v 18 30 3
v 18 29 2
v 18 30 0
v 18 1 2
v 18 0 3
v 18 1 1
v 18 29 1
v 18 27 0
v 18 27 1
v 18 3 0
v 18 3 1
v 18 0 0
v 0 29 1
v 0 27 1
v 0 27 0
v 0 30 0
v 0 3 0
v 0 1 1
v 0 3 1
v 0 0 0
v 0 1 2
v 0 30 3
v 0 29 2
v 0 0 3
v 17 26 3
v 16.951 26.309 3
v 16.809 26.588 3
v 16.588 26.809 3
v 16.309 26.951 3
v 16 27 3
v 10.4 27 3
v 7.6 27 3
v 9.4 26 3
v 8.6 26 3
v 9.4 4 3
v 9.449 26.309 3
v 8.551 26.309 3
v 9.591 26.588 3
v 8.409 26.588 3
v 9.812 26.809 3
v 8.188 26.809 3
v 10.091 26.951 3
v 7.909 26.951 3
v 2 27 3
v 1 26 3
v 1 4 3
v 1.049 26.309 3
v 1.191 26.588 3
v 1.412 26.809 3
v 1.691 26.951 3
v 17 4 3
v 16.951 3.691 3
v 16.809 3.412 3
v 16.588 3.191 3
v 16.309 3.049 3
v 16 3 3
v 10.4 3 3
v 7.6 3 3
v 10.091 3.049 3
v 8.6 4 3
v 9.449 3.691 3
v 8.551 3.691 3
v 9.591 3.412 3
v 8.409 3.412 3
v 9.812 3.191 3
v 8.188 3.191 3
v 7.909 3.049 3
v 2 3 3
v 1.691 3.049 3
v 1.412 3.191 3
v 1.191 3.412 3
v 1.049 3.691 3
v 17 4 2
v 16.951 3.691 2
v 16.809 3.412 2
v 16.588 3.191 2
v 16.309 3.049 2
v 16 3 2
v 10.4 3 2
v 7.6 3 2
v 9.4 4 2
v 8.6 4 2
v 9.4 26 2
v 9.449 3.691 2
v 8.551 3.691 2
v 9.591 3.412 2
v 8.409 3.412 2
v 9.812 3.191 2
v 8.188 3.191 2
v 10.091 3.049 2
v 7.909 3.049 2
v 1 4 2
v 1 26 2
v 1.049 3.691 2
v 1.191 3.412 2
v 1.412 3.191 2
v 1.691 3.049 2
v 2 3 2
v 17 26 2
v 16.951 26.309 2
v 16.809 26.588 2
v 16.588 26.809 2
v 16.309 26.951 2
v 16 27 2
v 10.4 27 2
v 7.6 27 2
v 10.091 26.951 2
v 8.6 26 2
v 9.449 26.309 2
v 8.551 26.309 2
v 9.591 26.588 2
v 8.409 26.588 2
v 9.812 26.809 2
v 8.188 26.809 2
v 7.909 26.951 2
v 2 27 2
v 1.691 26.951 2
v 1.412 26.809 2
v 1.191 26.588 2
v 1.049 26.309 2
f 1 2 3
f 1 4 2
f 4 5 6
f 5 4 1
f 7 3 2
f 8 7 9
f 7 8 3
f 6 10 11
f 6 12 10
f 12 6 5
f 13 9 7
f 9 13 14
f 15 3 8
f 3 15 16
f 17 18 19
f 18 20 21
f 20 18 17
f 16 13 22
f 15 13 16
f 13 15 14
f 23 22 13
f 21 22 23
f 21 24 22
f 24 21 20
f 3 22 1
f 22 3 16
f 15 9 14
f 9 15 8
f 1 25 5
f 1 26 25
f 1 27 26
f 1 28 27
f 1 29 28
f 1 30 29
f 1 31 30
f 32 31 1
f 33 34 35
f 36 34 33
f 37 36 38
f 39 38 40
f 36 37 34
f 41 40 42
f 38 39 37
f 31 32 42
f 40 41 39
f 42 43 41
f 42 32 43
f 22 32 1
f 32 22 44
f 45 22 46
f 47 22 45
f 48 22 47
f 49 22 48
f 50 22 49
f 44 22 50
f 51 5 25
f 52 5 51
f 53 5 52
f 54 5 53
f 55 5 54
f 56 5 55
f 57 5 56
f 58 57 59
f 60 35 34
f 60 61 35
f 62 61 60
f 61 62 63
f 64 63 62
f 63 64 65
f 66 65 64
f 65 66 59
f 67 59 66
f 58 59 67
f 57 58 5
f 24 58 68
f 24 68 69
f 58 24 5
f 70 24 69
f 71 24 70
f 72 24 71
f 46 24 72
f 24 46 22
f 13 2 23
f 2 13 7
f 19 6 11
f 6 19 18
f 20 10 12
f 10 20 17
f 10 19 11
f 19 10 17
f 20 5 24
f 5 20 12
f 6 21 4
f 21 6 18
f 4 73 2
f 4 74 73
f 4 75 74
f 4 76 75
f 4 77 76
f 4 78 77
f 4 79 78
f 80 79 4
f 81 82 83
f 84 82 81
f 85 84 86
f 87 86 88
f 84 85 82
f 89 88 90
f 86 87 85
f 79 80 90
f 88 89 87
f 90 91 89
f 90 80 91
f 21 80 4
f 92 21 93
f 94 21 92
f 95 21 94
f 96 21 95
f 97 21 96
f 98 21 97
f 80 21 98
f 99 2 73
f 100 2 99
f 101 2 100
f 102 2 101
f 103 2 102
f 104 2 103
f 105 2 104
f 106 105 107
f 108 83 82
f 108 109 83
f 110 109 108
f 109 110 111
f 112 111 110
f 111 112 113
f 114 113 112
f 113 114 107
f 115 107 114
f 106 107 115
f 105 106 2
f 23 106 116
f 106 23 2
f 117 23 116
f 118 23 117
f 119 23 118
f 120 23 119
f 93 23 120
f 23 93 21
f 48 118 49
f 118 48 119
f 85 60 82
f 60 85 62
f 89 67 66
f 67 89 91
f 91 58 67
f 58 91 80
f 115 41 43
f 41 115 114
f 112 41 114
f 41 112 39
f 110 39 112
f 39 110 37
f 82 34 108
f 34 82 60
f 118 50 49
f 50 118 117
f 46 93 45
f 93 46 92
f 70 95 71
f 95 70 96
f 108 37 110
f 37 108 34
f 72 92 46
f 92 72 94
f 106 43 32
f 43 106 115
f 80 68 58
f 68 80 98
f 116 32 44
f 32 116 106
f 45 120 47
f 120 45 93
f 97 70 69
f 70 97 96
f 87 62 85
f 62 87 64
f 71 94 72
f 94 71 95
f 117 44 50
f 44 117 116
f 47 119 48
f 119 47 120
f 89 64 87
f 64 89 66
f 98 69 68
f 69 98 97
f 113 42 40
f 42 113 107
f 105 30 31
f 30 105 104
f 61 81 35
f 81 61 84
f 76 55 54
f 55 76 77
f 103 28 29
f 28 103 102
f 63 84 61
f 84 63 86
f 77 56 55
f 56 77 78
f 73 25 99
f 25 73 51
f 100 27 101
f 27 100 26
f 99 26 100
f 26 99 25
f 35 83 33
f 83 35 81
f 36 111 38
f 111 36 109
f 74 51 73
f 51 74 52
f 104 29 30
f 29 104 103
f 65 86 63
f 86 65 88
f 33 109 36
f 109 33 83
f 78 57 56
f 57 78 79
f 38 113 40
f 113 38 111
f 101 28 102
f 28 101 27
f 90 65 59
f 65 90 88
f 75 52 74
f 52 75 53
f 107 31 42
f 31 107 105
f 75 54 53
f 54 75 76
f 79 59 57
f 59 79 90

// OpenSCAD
module cursor(
    width=18,
    cutoutLength=28,
    thickness=1,
    railLength=2,
    cutoutHeight=1
){
    difference(){
        group(){
            cube([width, railLength+thickness, thickness]);
            cube([width, thickness, thickness*2+cutoutHeight]);
            translate([0, cutoutLength-thickness, 0]){
                cube([width, railLength+thickness, thickness]);
                translate([0, railLength, 0])
                cube([width, thickness, thickness*2+cutoutHeight]);
            }
            translate([0, 0, thickness+cutoutHeight])
            cube([width, cutoutLength+(2*thickness), thickness]);
        }
        //hairline
        translate([thickness, railLength+thickness, thickness+cutoutHeight-0.5])
        hairline(w=width-2*thickness, l=cutoutLength-2*railLength, hairWidth=0.8, h=thickness+1);
    }
}

module hairline(
    w=16,
    l=24,
    h=2,
    hairWidth=0.8
){
    //2 cuboids separated by line
    roundedCuboid(r=1, w=w/2-hairWidth/2, l=l, h=h);
    translate([w/2+hairWidth/2, 0, 0])
    roundedCuboid(r=1, w=w/2-hairWidth/2, l=l, h=h);
}

module roundedCuboid(
    r=1,
    w=8,
    l=24,
    h=2,
    $fn=20
){
    hull(){
        translate([r, r, 0])
        cylinder(r=r, h=h, $fn=$fn);
        translate([w-r, r, 0])
        cylinder(r=r, h=h, $fn=$fn);
        translate([r, l-r, 0])
        cylinder(r=r, h=h, $fn=$fn);
        translate([w-r, l-r, 0])
        cylinder(r=r, h=h, $fn=$fn);
    }
}

cursor();
